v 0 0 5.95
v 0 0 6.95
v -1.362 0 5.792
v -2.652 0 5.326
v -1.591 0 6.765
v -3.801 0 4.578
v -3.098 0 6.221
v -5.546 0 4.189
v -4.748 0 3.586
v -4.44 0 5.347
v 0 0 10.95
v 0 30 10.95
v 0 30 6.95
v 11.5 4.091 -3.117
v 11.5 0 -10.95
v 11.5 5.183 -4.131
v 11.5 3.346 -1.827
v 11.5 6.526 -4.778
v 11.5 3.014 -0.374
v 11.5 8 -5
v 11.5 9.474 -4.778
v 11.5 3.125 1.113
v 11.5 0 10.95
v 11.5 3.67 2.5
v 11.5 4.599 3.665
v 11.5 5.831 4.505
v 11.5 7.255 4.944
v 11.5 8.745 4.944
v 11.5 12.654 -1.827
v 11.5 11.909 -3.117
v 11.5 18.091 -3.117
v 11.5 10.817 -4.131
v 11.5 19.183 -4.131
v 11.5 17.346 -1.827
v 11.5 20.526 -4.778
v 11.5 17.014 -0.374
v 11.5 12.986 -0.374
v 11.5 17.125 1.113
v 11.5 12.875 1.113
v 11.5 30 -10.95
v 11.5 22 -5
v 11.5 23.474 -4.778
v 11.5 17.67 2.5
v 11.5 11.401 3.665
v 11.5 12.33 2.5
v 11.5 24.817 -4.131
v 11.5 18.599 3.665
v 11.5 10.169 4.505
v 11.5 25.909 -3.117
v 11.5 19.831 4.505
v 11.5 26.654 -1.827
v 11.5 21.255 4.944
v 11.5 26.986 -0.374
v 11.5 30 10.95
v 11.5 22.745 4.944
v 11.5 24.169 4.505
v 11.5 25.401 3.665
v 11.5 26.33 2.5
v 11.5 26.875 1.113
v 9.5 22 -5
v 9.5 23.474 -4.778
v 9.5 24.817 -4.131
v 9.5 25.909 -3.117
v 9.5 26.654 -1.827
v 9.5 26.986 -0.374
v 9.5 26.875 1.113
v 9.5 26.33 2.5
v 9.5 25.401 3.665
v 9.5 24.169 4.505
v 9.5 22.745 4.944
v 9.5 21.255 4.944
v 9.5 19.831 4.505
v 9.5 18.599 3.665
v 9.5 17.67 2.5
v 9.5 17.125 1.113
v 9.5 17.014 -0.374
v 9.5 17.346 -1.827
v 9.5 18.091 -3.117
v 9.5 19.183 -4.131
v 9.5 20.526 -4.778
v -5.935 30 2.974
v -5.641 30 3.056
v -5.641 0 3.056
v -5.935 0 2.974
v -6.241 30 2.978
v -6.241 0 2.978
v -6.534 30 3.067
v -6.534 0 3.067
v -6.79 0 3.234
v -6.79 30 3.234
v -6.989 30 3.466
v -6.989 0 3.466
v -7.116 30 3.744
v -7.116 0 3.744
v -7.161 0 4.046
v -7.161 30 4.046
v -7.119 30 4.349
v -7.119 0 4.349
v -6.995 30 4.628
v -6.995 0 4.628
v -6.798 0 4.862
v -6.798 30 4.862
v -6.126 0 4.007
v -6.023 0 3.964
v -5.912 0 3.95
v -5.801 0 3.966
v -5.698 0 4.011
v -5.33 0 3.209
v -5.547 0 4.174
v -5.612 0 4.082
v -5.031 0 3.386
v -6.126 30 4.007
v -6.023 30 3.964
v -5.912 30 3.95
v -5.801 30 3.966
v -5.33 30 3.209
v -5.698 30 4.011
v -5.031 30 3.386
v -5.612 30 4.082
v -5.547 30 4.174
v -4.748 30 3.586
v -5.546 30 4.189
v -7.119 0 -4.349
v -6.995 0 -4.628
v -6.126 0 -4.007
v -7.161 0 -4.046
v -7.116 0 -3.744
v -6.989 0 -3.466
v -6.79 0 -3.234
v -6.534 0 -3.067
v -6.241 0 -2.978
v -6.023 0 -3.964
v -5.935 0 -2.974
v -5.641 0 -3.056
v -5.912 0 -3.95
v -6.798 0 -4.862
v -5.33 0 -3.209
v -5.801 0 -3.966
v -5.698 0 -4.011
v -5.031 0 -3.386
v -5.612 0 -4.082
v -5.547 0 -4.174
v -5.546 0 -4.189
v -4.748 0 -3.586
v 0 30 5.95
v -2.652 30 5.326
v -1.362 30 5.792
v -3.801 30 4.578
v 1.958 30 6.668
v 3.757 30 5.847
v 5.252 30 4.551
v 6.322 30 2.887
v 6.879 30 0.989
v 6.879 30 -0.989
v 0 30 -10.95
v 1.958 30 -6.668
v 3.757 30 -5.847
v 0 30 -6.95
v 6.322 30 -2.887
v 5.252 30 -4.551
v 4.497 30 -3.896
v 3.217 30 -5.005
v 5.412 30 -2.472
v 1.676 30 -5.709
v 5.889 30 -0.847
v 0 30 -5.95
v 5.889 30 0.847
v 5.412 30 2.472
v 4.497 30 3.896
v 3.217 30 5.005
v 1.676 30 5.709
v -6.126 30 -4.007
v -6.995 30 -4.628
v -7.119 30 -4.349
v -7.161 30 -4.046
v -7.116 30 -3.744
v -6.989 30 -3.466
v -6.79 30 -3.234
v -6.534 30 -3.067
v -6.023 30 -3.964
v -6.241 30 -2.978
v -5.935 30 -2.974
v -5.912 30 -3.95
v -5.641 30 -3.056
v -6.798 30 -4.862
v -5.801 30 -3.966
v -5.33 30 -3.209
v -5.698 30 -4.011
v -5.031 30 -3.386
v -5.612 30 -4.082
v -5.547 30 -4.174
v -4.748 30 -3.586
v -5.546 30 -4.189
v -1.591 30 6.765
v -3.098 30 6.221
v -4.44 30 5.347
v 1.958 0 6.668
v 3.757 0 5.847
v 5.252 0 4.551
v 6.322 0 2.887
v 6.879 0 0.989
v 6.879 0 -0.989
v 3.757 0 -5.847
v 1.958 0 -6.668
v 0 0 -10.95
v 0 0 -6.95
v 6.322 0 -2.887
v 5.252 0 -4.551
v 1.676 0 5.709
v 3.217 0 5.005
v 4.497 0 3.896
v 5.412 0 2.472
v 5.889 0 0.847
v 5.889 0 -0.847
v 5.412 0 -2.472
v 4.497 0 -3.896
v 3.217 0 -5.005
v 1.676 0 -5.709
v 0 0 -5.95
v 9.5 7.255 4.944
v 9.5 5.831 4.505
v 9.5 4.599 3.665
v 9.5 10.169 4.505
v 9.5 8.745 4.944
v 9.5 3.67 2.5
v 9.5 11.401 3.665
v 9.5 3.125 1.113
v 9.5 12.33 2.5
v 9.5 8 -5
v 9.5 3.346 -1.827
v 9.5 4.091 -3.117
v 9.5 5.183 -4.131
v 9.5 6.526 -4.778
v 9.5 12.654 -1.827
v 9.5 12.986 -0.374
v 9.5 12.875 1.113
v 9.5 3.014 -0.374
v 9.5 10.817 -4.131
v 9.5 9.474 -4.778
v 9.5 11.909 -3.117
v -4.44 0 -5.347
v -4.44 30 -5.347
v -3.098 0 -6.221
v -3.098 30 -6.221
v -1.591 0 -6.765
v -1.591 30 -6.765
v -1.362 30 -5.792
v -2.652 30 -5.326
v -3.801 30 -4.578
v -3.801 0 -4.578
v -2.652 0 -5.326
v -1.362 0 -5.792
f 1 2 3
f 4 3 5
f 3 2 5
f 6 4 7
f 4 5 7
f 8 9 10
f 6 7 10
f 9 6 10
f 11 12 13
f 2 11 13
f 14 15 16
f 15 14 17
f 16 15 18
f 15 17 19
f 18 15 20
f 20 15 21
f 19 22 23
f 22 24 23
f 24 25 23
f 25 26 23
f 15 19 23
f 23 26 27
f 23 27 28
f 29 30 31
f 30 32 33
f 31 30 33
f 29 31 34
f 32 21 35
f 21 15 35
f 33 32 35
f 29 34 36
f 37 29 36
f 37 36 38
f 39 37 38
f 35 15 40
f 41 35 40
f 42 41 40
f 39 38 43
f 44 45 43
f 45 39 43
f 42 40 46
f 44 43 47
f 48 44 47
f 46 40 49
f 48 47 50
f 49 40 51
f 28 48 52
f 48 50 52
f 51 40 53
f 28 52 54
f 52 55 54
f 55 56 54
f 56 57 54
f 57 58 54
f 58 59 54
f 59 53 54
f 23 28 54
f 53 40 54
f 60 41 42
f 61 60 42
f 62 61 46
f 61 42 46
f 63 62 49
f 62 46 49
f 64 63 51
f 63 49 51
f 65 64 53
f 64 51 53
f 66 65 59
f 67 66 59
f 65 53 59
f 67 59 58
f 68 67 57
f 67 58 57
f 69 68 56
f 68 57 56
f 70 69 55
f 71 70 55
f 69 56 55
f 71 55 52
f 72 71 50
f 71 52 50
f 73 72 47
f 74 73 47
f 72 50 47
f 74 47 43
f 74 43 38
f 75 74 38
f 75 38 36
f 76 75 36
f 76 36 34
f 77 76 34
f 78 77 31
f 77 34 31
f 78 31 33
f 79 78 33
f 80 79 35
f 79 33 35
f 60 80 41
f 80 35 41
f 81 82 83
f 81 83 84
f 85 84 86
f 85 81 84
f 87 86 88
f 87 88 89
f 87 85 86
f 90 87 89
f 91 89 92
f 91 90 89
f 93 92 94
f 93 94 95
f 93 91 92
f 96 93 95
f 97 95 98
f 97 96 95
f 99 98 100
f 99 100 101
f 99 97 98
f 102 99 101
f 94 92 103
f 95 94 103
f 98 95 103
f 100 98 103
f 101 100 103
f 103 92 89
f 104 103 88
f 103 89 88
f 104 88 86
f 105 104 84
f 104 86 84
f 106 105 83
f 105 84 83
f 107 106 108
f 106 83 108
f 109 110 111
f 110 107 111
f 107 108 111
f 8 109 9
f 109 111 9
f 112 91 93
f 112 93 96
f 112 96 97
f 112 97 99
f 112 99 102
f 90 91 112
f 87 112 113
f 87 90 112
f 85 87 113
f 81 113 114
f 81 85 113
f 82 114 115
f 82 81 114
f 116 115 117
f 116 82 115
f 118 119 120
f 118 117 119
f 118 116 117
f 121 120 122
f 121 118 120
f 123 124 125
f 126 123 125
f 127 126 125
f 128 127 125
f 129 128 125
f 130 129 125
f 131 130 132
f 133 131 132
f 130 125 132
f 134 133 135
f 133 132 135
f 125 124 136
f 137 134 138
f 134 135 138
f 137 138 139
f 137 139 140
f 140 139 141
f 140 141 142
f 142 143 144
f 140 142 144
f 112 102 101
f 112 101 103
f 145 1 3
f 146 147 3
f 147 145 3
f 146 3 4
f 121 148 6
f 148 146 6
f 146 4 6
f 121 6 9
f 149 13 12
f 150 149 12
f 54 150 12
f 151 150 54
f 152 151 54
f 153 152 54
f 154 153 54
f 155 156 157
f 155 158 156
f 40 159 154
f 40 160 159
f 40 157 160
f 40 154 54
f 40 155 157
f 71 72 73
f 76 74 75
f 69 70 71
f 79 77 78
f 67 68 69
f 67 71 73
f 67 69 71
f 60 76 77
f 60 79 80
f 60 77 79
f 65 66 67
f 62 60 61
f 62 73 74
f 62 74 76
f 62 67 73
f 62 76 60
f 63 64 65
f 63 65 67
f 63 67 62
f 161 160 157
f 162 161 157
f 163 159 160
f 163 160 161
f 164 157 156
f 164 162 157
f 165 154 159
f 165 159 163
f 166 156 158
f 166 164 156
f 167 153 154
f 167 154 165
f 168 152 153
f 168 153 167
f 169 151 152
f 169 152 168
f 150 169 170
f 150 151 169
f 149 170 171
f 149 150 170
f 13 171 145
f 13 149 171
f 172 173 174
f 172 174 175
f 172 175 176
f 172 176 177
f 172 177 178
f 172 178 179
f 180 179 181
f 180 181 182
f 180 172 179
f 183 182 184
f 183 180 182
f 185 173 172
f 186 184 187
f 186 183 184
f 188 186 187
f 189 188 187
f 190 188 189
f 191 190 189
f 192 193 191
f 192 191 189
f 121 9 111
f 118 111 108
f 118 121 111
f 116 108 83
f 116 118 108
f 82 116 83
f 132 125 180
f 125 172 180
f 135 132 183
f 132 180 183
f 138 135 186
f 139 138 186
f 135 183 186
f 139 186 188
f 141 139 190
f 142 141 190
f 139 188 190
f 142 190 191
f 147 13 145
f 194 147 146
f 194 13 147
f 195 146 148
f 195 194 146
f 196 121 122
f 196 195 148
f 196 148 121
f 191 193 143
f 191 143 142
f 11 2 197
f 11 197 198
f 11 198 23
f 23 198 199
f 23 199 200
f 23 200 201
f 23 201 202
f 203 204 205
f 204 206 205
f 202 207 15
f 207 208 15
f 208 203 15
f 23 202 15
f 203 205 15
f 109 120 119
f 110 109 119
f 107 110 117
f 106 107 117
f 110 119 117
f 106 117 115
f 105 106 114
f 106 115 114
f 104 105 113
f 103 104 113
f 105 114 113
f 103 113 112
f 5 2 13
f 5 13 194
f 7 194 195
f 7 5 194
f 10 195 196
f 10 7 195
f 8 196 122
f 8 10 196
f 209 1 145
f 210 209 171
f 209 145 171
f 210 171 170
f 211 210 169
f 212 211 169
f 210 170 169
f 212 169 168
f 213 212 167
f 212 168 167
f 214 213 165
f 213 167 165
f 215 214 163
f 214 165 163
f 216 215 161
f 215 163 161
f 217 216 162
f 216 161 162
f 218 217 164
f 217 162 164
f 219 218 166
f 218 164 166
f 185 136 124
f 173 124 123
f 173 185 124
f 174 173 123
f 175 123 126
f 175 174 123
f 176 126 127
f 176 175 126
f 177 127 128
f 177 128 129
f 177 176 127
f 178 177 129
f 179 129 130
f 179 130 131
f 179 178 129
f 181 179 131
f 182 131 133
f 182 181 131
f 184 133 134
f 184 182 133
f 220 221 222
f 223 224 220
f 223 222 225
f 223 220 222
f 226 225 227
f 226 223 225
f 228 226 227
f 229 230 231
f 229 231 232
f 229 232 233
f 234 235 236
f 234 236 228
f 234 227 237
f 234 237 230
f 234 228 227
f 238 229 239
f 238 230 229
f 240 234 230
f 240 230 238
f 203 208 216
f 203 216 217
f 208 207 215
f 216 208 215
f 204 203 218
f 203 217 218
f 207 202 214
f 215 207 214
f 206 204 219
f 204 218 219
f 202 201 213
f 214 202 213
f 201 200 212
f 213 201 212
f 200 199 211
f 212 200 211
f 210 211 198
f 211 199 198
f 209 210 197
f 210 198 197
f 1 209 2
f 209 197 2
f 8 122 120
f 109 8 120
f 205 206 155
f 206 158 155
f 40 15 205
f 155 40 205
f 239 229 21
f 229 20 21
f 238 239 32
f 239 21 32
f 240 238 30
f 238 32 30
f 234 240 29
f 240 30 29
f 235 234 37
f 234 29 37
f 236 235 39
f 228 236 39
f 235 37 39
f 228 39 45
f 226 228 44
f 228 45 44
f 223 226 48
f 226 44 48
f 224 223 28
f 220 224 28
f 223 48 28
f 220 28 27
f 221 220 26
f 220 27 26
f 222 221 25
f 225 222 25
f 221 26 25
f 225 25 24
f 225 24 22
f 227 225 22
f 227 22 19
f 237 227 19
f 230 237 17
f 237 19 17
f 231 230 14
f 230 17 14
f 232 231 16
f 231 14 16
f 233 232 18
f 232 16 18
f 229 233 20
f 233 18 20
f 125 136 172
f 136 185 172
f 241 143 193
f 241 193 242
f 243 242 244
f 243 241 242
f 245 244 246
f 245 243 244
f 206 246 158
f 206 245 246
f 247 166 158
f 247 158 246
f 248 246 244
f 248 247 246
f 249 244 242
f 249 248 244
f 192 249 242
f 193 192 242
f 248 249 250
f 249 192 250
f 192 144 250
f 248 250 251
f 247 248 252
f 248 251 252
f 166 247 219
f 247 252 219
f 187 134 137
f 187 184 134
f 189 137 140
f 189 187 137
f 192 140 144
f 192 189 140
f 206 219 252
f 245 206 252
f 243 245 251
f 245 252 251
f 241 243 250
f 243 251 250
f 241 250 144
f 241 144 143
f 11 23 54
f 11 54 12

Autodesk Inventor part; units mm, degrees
ref_plane "YZ Plane" through (0, 0, 0) normal (1, 0, 0) x (0, 1, 0)
ref_plane "XZ Plane" through (0, 0, 0) normal (0, 1, 0) x (-1, 0, 0)
ref_plane "XY Plane" through (0, 0, 0) normal (0, 0, 1) x (1, 0, 0)
sketch "Эскиз1" plane through (0, 0, 0) normal (0, 1, 0) x (-1, 0, 0)
  circle A0 centre (0, 0) radius 5.95
  circle A1 centre (0, 0) radius 6.95
  line L0 (0, 0) -> (5.546, 4.1887)
  line L1 (0, 0) -> (5.546, -4.1887)
  point P0 (4.748, -3.586)
  point P1 (4.748, 3.586)
  dimension "d0" = 11.9
  dimension "d1" = 13.9
extrude "Выдавливание1" add sketch "Эскиз1" along normal blind 30 contours A0 L1 A1 L0 picked at (4.878, 4.401)
sketch "Эскиз2" plane through (0, 30, 0) normal (0, 1, 0) x (1, 0, 0)
  arc A0 (-4.748, -3.586) -> (-5.6407, -3.0561) centre (-7.4493, -7.1199) ccw
  arc A1 (-5.6407, -3.0561) -> (-6.7976, -4.8618) centre (-6.075, -4.0513) ccw
  line L0 (-6.7976, -4.8618) -> (-6.1263, -4.0074)
  arc A2 (-5.5474, -4.1741) -> (-6.1263, -4.0074) centre (-5.9157, -4.3645) ccw
  line L1 (-4.748, -3.586) -> (-5.546, -4.1887)
  line L2 (-5.546, -4.1887) -> (-4.748, -3.586)
  line L3 (-5.546, -4.1887) -> (-5.5474, -4.1741)
  line L4 (-0.0151, 0) -> (-3.489, 0)
  arc A3 (-5.6407, 3.0561) -> (-4.748, 3.586) centre (-7.4493, 7.1199) ccw
  arc A4 (-6.1263, 4.0074) -> (-5.5474, 4.1741) centre (-5.9157, 4.3645) ccw
  line L5 (-4.748, 3.586) -> (-5.546, 4.1887)
  line L6 (-5.546, 4.1887) -> (-4.748, 3.586)
  line L7 (-5.546, 4.1887) -> (-5.5474, 4.1741)
  arc A5 (-6.7976, 4.8618) -> (-5.6407, 3.0561) centre (-6.075, 4.0513) ccw
  line L8 (-6.7976, 4.8618) -> (-6.1263, 4.0074)
  point P0 (-4.748, 3.586)
  point P1 (-5.546, -4.1887)
  point P2 (-5.3694, -4.0591)
  point P3 (-5.3694, 4.0591)
  dimension "d25" = 1.0859
sketch "Эскиз3" plane through (0, 30, 0) normal (0, 1, 0) x (1, 0, 0)
  arc A0 (-5.546, -4.1887) -> (-5.546, 4.1887) centre (0, 0) ccw projected
  line L0 (11.5, -6.95) -> (11.5, 6.95)
  arc A1 (-4.748, -3.586) -> (-4.748, 3.586) centre (0, 0) ccw projected
  line L1 (0, -6.95) -> (0, -5.95)
  line L2 (0, 5.95) -> (0, 6.95)
  line L3 (11.5, 6.95) -> (11.5, 10.95)
  line L4 (11.5, -6.95) -> (11.5, -10.95)
  line L5 (0, 2.45) -> (0, 6.95)
  line L6 (11.5, -10.95) -> (0, -10.95)
  line L7 (0, -10.95) -> (0, -6.95)
  line L8 (11.5, 10.95) -> (0, 10.95)
  line L9 (0, 10.95) -> (0, 6.95)
  arc A2 (0, -5.95) -> (0, 5.95) centre (0, 0) ccw
  dimension "d13" = 4
  dimension "d14" = 4
  dimension "d22" = 21.9
  dimension "d23" = 5
extrude "Выдавливание3" add sketch "Эскиз3" against normal blind 30
ref_plane "РабПлоскость1" through (11.5, 20, 4.95) normal (1, 0, 0) x (0, 0, -1)
sketch "Эскиз4" plane through (11.5, 20, 4.95) normal (1, 0, 0) x (0, 0, -1)
  line L0 (4.95, -20) -> (4.95, 10)
  line L1 (1, 10) -> (8.9, 10) projected
  circle A0 centre (4.95, -12) radius 5
  line L2 (14.4, -20) -> (-4.5, -20) projected
  circle A1 centre (4.95, 2) radius 5
  line L3 (-4.5, 10) -> (14.4, 10) projected
  point P0 (7.3306, 10)
  point P1 (2.5694, 10)
  point P2 (4.95, 10)
  dimension "d15" = 10
  dimension "d16" = 8
  dimension "d17" = 10
  dimension "d18" = 8
extrude "Выдавливание4" cut sketch "Эскиз4" against normal blind 2
extrude "Выдавливание5" add sketch "Эскиз2" against normal blind 30
sketch "Эскиз5" plane through (0, 30, 0) normal (0, 1, 0) x (1, 0, 0)
  arc A0 (0, 6.95) -> (-5.546, 4.1887) centre (0, 0) ccw projected
  line L0 (-5.546, 4.1887) -> (-5.5474, 4.1741) projected
  arc A1 (-6.1263, 4.0074) -> (-5.5474, 4.1741) centre (-5.9157, 4.3645) ccw projected
  line L1 (-6.1263, 4.0074) -> (-6.7976, 4.8618) projected
  arc A2 (-6.7976, 4.8618) -> (-5.6407, 3.0561) centre (-6.075, 4.0513) ccw projected
  arc A3 (-5.6407, 3.0561) -> (-4.748, 3.586) centre (-7.4493, 7.1199) ccw projected
  arc A4 (-4.748, -3.586) -> (-4.748, 3.586) centre (0, 0) ccw projected
  arc A5 (-4.748, -3.586) -> (-5.6407, -3.0561) centre (-7.4493, -7.1199) ccw projected
  arc A6 (-5.6407, -3.0561) -> (-6.7976, -4.8618) centre (-6.075, -4.0513) ccw projected
  line L2 (-6.7976, -4.8618) -> (-6.1263, -4.0074) projected
  arc A7 (-5.5474, -4.1741) -> (-6.1263, -4.0074) centre (-5.9157, -4.3645) ccw projected
  line L3 (-5.5474, -4.1741) -> (-5.546, -4.1887) projected
  arc A8 (-5.546, -4.1887) -> (0, -6.95) centre (0, 0) ccw projected
  line L4 (0, -6.95) -> (0, -10.95) projected
  line L5 (0, -10.95) -> (11.5, -10.95) projected
  line L6 (11.5, -10.95) -> (11.5, 10.95) projected
  line L7 (11.5, 10.95) -> (0, 10.95) projected
  line L8 (0, 10.95) -> (0, 6.95) projected
  line L9 (0, 5.95) -> (0, 6.95)
  line L10 (0, -5.95) -> (0, -6.95)
extrude "Выдавливание6" [suppressed]
sketch "Эскиз6" plane through (11.5, 30, 10.95) normal (1, 0, 0) x (0, 0, -1)
  arc A0 (15.95, -22) -> (15.95, -22) centre (10.95, -22) ccw projected
  arc A1 (15.95, -8) -> (15.95, -8) centre (10.95, -8) ccw projected
  point P0 (10.95, -30)
extrude "Выдавливание7" [suppressed]
properties part number "крепление маркера 12мм"
